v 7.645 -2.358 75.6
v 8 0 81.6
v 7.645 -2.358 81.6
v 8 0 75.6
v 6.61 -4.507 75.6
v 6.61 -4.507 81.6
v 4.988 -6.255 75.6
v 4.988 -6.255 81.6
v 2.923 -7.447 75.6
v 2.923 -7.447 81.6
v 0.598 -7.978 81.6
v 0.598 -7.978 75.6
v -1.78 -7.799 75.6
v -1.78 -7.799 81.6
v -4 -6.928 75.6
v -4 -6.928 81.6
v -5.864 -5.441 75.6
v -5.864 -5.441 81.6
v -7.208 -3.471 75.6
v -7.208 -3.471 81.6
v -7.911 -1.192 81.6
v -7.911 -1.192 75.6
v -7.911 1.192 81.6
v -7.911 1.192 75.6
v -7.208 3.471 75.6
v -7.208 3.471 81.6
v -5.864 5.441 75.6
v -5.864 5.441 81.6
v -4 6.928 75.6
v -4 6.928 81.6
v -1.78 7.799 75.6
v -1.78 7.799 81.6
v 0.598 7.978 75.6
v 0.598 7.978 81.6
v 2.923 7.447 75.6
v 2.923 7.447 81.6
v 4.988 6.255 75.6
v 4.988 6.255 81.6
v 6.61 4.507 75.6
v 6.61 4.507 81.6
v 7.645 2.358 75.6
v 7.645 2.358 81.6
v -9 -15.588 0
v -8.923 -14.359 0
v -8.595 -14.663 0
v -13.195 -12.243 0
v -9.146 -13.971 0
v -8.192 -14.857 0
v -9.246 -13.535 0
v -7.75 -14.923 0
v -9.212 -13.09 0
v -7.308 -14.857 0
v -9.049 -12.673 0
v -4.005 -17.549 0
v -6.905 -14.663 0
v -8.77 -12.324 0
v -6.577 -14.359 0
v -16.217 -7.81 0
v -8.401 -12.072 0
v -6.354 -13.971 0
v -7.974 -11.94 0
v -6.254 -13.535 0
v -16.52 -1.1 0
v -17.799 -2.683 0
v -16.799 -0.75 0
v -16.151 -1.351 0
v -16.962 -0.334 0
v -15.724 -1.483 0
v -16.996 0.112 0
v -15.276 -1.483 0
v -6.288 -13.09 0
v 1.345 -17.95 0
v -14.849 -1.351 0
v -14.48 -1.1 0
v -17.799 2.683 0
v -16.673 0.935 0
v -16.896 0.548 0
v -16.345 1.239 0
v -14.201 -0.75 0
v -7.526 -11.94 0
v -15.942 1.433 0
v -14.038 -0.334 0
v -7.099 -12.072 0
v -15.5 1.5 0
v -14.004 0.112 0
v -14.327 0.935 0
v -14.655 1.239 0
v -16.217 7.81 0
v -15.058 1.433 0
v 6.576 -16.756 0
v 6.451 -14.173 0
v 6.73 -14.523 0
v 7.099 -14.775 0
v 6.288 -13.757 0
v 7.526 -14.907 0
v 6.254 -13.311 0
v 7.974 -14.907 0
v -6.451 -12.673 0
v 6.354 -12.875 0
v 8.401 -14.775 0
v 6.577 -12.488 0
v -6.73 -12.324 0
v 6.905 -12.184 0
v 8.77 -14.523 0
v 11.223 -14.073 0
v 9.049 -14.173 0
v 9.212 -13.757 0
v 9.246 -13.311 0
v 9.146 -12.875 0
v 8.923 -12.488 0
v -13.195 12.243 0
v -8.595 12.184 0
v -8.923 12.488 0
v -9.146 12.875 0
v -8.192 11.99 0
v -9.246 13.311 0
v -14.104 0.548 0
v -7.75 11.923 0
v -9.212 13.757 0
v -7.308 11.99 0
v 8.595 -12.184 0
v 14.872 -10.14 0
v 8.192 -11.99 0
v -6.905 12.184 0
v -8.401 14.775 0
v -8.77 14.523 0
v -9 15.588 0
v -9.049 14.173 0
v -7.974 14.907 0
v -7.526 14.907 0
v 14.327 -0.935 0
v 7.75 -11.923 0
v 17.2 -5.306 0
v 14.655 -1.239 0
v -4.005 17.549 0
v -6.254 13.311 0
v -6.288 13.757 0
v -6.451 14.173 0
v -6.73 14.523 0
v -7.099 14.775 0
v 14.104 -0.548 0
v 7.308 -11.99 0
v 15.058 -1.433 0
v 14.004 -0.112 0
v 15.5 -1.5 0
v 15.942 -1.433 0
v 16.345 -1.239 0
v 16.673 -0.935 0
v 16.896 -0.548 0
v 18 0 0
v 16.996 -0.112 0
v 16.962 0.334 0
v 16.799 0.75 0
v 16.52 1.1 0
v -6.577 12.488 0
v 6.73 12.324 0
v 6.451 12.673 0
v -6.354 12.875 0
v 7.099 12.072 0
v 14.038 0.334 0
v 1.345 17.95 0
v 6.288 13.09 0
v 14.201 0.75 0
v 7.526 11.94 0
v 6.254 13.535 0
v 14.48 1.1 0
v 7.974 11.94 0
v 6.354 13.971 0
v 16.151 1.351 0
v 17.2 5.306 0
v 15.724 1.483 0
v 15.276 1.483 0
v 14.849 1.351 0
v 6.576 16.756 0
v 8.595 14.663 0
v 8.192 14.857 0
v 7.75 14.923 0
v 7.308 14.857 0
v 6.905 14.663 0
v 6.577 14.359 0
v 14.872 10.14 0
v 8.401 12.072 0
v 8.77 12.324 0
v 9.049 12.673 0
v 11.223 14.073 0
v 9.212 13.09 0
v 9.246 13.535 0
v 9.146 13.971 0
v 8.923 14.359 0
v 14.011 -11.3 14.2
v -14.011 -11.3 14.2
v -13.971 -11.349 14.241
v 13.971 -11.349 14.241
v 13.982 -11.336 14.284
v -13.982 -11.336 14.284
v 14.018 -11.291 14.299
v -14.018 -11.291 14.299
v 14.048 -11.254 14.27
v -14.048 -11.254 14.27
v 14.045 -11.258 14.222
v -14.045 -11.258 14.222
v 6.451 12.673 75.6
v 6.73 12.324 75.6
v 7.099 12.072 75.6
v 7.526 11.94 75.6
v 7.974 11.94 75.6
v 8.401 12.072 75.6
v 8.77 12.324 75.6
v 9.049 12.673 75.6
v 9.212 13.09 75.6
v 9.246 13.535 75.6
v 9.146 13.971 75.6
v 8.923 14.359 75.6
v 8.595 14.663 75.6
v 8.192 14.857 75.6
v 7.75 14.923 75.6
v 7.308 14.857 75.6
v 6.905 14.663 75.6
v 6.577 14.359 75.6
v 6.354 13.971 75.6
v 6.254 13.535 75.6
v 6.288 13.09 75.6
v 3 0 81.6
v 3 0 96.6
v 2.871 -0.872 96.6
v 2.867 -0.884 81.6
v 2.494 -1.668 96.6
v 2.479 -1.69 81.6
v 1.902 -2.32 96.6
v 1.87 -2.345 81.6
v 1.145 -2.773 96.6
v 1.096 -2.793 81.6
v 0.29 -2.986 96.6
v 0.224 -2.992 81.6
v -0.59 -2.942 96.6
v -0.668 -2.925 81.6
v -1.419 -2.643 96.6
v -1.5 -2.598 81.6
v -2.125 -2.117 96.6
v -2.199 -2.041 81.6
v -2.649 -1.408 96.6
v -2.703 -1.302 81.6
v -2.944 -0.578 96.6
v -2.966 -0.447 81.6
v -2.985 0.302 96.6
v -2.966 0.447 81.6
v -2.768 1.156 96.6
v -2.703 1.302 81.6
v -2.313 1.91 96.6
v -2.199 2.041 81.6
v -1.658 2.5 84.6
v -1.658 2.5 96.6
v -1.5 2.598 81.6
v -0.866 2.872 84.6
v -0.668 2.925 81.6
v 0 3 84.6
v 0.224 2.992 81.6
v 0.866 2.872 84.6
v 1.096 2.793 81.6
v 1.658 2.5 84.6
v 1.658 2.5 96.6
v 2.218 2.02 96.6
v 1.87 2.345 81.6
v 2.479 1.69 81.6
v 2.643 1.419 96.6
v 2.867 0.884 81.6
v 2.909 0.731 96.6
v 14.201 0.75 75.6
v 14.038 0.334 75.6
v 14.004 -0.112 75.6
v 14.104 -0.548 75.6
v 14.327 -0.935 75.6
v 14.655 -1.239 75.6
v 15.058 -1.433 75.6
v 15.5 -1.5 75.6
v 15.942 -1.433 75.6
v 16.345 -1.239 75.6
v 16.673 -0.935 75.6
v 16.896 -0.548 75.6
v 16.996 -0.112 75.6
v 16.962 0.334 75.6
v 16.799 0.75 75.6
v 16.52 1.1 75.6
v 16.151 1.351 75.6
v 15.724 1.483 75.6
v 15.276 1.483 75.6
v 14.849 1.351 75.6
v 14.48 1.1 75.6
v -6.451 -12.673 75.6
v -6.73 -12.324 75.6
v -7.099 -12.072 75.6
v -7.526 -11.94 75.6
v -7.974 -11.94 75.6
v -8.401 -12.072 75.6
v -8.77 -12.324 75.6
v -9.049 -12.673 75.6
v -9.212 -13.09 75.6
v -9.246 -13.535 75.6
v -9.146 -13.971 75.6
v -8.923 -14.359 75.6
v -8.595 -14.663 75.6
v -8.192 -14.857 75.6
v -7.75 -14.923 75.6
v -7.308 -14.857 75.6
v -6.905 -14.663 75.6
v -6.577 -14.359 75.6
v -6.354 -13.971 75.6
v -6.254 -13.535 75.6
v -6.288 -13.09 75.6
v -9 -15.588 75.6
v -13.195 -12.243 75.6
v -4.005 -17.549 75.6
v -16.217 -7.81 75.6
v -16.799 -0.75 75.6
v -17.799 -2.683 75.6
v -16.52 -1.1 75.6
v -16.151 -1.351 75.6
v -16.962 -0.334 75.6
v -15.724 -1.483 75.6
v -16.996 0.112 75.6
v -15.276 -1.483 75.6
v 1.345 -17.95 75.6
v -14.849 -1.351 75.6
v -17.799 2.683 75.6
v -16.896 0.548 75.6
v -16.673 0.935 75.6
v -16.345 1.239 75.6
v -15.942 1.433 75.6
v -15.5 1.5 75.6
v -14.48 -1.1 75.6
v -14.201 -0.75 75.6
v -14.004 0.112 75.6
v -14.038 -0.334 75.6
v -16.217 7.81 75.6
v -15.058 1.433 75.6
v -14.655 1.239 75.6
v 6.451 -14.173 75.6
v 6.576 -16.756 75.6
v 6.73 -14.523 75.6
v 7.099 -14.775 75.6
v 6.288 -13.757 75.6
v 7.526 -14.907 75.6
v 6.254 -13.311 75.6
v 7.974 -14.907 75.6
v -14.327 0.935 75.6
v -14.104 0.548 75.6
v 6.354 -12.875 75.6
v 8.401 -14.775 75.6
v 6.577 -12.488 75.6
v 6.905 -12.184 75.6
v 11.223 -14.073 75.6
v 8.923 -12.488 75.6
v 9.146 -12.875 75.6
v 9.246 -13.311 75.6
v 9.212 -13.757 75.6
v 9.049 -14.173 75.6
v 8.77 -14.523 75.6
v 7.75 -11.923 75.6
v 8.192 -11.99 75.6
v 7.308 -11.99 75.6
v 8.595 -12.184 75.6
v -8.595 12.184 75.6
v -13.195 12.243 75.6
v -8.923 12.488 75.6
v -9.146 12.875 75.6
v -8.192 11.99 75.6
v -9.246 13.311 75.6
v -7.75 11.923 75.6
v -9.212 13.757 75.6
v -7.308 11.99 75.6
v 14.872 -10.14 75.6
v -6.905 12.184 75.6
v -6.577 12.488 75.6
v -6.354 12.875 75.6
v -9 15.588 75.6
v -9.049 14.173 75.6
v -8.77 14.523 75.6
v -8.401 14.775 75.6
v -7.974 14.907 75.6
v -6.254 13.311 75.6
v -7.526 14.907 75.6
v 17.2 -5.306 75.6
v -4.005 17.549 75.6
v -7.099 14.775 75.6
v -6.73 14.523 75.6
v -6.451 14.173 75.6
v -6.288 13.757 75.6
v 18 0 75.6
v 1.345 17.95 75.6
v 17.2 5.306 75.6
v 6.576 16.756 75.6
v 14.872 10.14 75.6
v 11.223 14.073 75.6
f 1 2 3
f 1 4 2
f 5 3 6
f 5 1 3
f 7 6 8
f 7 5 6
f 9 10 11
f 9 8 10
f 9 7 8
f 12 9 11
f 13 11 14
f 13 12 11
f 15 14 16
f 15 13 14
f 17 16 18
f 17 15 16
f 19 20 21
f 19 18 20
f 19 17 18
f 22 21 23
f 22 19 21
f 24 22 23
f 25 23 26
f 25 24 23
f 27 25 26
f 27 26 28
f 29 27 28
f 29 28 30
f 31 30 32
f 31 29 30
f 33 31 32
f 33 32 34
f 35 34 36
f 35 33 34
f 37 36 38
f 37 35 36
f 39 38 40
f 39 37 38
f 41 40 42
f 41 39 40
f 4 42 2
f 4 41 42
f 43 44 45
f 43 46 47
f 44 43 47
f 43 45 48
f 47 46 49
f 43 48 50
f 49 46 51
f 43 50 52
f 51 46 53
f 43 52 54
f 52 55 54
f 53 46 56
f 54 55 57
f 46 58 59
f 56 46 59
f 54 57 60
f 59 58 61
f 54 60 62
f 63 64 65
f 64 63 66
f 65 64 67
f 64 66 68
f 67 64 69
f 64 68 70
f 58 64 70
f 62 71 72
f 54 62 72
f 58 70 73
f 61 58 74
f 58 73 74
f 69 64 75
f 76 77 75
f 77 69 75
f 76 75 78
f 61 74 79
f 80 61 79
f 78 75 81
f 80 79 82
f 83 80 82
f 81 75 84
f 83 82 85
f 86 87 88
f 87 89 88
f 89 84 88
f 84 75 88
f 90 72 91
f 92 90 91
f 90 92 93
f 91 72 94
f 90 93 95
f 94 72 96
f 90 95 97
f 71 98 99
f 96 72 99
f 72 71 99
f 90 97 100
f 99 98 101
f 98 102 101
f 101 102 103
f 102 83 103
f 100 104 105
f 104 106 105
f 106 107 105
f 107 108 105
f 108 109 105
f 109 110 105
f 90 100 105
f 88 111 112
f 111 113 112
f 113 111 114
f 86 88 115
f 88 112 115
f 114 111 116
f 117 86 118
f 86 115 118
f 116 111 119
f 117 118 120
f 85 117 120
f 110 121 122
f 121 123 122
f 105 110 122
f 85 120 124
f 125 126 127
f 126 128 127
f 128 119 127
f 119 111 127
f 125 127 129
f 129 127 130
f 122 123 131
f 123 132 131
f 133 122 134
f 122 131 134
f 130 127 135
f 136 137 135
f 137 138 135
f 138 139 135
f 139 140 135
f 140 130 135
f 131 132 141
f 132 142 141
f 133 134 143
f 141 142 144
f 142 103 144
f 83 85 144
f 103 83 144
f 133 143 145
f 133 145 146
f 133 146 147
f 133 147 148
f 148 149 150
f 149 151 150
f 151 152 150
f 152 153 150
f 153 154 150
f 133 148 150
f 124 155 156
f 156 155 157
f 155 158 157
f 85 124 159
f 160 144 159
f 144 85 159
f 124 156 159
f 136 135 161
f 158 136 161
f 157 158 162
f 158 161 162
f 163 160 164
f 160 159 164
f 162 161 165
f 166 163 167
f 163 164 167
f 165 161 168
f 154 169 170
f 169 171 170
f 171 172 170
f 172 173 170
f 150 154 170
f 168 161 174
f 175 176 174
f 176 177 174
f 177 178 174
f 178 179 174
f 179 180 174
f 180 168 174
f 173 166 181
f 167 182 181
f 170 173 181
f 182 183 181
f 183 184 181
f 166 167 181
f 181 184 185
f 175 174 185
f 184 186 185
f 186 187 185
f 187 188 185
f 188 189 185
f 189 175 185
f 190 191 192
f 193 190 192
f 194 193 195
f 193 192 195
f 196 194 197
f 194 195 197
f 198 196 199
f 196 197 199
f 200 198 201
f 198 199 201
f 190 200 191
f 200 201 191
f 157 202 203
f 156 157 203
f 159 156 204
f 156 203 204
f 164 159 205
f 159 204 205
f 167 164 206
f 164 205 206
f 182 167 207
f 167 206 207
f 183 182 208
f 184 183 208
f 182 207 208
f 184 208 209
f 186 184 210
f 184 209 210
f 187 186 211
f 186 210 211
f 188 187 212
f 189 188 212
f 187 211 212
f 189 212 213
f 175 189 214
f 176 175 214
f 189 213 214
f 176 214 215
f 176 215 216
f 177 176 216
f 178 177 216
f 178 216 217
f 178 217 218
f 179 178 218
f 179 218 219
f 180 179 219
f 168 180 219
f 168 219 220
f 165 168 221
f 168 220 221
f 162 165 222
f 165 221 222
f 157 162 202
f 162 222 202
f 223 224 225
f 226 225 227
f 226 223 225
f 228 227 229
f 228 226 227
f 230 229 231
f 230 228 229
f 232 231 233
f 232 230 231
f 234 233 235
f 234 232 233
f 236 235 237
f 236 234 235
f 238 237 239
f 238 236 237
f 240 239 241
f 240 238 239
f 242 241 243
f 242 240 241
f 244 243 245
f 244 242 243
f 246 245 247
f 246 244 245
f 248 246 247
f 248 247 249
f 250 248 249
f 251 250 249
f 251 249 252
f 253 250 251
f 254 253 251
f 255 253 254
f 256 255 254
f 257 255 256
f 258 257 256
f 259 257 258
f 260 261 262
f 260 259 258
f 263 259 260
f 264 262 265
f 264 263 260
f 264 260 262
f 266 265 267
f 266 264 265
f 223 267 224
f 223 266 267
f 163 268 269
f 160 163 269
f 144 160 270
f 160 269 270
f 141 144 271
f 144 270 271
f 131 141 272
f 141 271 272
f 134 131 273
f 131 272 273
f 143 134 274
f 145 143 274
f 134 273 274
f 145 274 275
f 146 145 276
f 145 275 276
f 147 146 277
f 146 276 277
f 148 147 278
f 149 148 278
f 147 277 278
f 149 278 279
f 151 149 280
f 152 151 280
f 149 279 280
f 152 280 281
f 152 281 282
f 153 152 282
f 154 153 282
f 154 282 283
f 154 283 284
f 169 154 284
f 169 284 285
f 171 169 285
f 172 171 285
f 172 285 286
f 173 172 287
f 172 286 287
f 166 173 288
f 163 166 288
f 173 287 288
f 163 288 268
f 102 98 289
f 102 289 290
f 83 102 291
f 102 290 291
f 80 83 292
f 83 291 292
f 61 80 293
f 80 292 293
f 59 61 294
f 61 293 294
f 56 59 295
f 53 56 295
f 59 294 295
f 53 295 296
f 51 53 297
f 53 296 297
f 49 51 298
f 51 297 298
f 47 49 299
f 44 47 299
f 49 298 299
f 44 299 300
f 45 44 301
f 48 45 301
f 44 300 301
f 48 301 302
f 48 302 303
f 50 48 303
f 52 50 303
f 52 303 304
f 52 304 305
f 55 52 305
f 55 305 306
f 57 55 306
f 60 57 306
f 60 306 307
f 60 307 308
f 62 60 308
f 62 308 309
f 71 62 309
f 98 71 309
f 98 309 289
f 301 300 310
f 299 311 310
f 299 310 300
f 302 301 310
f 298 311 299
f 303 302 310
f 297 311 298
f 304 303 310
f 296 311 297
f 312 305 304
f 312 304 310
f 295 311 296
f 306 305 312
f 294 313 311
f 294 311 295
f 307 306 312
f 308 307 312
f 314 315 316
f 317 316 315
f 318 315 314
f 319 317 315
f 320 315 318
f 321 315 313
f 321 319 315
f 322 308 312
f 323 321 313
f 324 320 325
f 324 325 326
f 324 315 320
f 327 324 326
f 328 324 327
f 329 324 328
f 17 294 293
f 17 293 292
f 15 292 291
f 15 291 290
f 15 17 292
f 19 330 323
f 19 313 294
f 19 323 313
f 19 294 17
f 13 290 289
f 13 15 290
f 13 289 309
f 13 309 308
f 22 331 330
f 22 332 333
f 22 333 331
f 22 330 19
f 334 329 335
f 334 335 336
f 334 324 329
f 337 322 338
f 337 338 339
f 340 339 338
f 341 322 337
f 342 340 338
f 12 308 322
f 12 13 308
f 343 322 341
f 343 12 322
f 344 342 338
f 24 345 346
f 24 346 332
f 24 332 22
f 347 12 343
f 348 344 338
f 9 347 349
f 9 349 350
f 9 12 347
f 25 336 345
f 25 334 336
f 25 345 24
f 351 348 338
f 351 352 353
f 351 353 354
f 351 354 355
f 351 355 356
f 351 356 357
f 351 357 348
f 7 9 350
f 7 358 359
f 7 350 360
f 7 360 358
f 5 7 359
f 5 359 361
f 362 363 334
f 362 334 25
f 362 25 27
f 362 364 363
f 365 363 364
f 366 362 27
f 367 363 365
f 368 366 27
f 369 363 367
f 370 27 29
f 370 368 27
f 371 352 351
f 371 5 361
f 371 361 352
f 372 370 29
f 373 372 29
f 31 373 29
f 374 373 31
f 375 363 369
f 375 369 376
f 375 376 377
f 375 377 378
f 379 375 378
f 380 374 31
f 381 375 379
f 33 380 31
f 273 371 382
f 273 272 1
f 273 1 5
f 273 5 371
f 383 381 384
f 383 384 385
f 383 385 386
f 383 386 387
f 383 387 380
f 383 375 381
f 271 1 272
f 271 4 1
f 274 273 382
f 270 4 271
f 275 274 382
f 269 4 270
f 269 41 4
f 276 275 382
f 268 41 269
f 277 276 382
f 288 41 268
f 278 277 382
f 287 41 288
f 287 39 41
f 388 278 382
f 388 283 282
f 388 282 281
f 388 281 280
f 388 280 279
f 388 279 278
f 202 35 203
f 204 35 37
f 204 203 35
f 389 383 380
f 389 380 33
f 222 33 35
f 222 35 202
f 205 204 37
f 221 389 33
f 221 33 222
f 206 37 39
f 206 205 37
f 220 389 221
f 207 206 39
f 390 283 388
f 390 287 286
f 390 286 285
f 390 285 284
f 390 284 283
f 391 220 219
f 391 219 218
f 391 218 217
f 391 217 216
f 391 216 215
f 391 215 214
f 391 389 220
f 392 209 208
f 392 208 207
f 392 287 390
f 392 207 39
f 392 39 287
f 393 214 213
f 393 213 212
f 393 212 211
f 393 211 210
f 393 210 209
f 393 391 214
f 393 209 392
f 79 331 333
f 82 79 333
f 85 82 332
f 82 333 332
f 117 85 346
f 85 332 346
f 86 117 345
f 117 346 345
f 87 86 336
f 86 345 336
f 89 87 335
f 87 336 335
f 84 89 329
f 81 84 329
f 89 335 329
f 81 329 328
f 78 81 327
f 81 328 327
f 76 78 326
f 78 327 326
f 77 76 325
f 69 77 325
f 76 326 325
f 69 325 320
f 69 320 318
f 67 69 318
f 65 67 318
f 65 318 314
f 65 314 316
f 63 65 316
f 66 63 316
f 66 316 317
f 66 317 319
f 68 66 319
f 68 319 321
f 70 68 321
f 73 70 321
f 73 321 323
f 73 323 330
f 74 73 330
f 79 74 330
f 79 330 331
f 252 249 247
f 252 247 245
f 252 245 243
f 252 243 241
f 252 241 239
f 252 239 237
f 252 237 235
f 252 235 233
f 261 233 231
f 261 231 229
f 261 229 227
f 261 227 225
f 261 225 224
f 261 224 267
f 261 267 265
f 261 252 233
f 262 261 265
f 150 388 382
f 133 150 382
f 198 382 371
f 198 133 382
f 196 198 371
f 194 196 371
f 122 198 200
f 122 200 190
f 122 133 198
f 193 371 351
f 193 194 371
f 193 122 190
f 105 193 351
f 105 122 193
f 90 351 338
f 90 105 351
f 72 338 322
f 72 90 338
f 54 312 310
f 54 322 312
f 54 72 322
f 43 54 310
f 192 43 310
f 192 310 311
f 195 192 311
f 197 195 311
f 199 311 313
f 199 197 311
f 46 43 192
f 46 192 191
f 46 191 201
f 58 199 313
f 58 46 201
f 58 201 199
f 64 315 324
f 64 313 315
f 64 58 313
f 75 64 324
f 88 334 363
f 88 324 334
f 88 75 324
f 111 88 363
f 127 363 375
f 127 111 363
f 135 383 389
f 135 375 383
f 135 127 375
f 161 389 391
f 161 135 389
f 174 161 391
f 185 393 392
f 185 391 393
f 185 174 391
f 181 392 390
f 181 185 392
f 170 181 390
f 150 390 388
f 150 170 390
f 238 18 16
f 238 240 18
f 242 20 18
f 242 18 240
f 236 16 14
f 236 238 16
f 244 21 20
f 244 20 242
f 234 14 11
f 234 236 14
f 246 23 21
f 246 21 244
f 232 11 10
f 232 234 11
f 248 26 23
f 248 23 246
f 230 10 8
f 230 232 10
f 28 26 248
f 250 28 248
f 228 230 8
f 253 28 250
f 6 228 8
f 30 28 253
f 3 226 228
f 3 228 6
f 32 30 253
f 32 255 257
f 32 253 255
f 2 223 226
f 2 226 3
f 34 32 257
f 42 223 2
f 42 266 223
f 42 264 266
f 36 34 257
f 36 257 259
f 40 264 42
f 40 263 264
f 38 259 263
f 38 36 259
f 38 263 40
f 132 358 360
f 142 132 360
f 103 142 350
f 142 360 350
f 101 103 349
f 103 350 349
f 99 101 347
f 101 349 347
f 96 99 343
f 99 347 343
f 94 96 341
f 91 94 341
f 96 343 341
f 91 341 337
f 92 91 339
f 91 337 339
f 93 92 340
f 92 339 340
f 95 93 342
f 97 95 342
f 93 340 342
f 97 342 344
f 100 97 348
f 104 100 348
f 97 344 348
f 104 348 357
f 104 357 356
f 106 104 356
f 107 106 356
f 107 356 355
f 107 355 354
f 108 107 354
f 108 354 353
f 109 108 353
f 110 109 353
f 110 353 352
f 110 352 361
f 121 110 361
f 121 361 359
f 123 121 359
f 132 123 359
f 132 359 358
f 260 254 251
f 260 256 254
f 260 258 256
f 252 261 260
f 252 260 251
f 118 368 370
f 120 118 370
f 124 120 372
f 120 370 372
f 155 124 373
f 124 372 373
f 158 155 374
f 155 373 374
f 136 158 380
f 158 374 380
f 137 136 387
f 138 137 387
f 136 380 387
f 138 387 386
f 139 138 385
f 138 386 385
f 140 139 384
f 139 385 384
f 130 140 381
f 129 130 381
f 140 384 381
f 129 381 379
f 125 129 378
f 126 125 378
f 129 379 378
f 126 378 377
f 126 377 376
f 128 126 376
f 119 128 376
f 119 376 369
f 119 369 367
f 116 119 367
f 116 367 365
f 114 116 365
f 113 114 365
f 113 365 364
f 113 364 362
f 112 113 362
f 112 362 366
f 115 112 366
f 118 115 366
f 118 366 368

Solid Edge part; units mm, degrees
sketch "Sketch1" plane through (0, 0, 0) normal (0, 0, 1) x (1, 0, 0)
  circle A0 centre (0, 0) radius 18
  dimension "D1" = 36
extrude "Protrusion1" add sketch "Sketch1" along normal blind 75.6
sketch "Sketch2" plane through (0, 0, 75.6) normal (0, 0, 1) x (1, 0, 0)
  circle A0 centre (0, 0) radius 8
extrude "ExtrudedProtrusion_2" add sketch "Sketch2" along normal blind 6
sketch "Sketch3" plane through (0, 7, 81.6) normal (0, 0, 1) x (1, 0, 0)
  circle A0 centre (0, -7) radius 3
extrude "ExtrudedProtrusion_3" add sketch "Sketch3" along normal blind 15
sketch "Sketch4" plane through (0, 7, 96.6) normal (0, 0, 1) x (1, 0, 0)
  line L0 (-1.6583, -4.5) -> (1.6583, -4.5)
  dimension "D1" = 2.5
extrude "ExtrudedCutout_1" cut sketch "Sketch4" against normal blind 12 material side at (0, 2.55, 96.6)
hole "Hole_1" at (-7.75, 13.4234, 75.6) direction (0, 0, -1) diameter 3 end through all
pattern_circular "Pattern1" count 6 over 360 about axis through (0, 0, 75.6) along (0, 0, -1) of "Hole_1"
hole "Hole_7" at (26.5, -11.3, 14.25) direction (-1, 0, 0) diameter 0.1 depth 140
